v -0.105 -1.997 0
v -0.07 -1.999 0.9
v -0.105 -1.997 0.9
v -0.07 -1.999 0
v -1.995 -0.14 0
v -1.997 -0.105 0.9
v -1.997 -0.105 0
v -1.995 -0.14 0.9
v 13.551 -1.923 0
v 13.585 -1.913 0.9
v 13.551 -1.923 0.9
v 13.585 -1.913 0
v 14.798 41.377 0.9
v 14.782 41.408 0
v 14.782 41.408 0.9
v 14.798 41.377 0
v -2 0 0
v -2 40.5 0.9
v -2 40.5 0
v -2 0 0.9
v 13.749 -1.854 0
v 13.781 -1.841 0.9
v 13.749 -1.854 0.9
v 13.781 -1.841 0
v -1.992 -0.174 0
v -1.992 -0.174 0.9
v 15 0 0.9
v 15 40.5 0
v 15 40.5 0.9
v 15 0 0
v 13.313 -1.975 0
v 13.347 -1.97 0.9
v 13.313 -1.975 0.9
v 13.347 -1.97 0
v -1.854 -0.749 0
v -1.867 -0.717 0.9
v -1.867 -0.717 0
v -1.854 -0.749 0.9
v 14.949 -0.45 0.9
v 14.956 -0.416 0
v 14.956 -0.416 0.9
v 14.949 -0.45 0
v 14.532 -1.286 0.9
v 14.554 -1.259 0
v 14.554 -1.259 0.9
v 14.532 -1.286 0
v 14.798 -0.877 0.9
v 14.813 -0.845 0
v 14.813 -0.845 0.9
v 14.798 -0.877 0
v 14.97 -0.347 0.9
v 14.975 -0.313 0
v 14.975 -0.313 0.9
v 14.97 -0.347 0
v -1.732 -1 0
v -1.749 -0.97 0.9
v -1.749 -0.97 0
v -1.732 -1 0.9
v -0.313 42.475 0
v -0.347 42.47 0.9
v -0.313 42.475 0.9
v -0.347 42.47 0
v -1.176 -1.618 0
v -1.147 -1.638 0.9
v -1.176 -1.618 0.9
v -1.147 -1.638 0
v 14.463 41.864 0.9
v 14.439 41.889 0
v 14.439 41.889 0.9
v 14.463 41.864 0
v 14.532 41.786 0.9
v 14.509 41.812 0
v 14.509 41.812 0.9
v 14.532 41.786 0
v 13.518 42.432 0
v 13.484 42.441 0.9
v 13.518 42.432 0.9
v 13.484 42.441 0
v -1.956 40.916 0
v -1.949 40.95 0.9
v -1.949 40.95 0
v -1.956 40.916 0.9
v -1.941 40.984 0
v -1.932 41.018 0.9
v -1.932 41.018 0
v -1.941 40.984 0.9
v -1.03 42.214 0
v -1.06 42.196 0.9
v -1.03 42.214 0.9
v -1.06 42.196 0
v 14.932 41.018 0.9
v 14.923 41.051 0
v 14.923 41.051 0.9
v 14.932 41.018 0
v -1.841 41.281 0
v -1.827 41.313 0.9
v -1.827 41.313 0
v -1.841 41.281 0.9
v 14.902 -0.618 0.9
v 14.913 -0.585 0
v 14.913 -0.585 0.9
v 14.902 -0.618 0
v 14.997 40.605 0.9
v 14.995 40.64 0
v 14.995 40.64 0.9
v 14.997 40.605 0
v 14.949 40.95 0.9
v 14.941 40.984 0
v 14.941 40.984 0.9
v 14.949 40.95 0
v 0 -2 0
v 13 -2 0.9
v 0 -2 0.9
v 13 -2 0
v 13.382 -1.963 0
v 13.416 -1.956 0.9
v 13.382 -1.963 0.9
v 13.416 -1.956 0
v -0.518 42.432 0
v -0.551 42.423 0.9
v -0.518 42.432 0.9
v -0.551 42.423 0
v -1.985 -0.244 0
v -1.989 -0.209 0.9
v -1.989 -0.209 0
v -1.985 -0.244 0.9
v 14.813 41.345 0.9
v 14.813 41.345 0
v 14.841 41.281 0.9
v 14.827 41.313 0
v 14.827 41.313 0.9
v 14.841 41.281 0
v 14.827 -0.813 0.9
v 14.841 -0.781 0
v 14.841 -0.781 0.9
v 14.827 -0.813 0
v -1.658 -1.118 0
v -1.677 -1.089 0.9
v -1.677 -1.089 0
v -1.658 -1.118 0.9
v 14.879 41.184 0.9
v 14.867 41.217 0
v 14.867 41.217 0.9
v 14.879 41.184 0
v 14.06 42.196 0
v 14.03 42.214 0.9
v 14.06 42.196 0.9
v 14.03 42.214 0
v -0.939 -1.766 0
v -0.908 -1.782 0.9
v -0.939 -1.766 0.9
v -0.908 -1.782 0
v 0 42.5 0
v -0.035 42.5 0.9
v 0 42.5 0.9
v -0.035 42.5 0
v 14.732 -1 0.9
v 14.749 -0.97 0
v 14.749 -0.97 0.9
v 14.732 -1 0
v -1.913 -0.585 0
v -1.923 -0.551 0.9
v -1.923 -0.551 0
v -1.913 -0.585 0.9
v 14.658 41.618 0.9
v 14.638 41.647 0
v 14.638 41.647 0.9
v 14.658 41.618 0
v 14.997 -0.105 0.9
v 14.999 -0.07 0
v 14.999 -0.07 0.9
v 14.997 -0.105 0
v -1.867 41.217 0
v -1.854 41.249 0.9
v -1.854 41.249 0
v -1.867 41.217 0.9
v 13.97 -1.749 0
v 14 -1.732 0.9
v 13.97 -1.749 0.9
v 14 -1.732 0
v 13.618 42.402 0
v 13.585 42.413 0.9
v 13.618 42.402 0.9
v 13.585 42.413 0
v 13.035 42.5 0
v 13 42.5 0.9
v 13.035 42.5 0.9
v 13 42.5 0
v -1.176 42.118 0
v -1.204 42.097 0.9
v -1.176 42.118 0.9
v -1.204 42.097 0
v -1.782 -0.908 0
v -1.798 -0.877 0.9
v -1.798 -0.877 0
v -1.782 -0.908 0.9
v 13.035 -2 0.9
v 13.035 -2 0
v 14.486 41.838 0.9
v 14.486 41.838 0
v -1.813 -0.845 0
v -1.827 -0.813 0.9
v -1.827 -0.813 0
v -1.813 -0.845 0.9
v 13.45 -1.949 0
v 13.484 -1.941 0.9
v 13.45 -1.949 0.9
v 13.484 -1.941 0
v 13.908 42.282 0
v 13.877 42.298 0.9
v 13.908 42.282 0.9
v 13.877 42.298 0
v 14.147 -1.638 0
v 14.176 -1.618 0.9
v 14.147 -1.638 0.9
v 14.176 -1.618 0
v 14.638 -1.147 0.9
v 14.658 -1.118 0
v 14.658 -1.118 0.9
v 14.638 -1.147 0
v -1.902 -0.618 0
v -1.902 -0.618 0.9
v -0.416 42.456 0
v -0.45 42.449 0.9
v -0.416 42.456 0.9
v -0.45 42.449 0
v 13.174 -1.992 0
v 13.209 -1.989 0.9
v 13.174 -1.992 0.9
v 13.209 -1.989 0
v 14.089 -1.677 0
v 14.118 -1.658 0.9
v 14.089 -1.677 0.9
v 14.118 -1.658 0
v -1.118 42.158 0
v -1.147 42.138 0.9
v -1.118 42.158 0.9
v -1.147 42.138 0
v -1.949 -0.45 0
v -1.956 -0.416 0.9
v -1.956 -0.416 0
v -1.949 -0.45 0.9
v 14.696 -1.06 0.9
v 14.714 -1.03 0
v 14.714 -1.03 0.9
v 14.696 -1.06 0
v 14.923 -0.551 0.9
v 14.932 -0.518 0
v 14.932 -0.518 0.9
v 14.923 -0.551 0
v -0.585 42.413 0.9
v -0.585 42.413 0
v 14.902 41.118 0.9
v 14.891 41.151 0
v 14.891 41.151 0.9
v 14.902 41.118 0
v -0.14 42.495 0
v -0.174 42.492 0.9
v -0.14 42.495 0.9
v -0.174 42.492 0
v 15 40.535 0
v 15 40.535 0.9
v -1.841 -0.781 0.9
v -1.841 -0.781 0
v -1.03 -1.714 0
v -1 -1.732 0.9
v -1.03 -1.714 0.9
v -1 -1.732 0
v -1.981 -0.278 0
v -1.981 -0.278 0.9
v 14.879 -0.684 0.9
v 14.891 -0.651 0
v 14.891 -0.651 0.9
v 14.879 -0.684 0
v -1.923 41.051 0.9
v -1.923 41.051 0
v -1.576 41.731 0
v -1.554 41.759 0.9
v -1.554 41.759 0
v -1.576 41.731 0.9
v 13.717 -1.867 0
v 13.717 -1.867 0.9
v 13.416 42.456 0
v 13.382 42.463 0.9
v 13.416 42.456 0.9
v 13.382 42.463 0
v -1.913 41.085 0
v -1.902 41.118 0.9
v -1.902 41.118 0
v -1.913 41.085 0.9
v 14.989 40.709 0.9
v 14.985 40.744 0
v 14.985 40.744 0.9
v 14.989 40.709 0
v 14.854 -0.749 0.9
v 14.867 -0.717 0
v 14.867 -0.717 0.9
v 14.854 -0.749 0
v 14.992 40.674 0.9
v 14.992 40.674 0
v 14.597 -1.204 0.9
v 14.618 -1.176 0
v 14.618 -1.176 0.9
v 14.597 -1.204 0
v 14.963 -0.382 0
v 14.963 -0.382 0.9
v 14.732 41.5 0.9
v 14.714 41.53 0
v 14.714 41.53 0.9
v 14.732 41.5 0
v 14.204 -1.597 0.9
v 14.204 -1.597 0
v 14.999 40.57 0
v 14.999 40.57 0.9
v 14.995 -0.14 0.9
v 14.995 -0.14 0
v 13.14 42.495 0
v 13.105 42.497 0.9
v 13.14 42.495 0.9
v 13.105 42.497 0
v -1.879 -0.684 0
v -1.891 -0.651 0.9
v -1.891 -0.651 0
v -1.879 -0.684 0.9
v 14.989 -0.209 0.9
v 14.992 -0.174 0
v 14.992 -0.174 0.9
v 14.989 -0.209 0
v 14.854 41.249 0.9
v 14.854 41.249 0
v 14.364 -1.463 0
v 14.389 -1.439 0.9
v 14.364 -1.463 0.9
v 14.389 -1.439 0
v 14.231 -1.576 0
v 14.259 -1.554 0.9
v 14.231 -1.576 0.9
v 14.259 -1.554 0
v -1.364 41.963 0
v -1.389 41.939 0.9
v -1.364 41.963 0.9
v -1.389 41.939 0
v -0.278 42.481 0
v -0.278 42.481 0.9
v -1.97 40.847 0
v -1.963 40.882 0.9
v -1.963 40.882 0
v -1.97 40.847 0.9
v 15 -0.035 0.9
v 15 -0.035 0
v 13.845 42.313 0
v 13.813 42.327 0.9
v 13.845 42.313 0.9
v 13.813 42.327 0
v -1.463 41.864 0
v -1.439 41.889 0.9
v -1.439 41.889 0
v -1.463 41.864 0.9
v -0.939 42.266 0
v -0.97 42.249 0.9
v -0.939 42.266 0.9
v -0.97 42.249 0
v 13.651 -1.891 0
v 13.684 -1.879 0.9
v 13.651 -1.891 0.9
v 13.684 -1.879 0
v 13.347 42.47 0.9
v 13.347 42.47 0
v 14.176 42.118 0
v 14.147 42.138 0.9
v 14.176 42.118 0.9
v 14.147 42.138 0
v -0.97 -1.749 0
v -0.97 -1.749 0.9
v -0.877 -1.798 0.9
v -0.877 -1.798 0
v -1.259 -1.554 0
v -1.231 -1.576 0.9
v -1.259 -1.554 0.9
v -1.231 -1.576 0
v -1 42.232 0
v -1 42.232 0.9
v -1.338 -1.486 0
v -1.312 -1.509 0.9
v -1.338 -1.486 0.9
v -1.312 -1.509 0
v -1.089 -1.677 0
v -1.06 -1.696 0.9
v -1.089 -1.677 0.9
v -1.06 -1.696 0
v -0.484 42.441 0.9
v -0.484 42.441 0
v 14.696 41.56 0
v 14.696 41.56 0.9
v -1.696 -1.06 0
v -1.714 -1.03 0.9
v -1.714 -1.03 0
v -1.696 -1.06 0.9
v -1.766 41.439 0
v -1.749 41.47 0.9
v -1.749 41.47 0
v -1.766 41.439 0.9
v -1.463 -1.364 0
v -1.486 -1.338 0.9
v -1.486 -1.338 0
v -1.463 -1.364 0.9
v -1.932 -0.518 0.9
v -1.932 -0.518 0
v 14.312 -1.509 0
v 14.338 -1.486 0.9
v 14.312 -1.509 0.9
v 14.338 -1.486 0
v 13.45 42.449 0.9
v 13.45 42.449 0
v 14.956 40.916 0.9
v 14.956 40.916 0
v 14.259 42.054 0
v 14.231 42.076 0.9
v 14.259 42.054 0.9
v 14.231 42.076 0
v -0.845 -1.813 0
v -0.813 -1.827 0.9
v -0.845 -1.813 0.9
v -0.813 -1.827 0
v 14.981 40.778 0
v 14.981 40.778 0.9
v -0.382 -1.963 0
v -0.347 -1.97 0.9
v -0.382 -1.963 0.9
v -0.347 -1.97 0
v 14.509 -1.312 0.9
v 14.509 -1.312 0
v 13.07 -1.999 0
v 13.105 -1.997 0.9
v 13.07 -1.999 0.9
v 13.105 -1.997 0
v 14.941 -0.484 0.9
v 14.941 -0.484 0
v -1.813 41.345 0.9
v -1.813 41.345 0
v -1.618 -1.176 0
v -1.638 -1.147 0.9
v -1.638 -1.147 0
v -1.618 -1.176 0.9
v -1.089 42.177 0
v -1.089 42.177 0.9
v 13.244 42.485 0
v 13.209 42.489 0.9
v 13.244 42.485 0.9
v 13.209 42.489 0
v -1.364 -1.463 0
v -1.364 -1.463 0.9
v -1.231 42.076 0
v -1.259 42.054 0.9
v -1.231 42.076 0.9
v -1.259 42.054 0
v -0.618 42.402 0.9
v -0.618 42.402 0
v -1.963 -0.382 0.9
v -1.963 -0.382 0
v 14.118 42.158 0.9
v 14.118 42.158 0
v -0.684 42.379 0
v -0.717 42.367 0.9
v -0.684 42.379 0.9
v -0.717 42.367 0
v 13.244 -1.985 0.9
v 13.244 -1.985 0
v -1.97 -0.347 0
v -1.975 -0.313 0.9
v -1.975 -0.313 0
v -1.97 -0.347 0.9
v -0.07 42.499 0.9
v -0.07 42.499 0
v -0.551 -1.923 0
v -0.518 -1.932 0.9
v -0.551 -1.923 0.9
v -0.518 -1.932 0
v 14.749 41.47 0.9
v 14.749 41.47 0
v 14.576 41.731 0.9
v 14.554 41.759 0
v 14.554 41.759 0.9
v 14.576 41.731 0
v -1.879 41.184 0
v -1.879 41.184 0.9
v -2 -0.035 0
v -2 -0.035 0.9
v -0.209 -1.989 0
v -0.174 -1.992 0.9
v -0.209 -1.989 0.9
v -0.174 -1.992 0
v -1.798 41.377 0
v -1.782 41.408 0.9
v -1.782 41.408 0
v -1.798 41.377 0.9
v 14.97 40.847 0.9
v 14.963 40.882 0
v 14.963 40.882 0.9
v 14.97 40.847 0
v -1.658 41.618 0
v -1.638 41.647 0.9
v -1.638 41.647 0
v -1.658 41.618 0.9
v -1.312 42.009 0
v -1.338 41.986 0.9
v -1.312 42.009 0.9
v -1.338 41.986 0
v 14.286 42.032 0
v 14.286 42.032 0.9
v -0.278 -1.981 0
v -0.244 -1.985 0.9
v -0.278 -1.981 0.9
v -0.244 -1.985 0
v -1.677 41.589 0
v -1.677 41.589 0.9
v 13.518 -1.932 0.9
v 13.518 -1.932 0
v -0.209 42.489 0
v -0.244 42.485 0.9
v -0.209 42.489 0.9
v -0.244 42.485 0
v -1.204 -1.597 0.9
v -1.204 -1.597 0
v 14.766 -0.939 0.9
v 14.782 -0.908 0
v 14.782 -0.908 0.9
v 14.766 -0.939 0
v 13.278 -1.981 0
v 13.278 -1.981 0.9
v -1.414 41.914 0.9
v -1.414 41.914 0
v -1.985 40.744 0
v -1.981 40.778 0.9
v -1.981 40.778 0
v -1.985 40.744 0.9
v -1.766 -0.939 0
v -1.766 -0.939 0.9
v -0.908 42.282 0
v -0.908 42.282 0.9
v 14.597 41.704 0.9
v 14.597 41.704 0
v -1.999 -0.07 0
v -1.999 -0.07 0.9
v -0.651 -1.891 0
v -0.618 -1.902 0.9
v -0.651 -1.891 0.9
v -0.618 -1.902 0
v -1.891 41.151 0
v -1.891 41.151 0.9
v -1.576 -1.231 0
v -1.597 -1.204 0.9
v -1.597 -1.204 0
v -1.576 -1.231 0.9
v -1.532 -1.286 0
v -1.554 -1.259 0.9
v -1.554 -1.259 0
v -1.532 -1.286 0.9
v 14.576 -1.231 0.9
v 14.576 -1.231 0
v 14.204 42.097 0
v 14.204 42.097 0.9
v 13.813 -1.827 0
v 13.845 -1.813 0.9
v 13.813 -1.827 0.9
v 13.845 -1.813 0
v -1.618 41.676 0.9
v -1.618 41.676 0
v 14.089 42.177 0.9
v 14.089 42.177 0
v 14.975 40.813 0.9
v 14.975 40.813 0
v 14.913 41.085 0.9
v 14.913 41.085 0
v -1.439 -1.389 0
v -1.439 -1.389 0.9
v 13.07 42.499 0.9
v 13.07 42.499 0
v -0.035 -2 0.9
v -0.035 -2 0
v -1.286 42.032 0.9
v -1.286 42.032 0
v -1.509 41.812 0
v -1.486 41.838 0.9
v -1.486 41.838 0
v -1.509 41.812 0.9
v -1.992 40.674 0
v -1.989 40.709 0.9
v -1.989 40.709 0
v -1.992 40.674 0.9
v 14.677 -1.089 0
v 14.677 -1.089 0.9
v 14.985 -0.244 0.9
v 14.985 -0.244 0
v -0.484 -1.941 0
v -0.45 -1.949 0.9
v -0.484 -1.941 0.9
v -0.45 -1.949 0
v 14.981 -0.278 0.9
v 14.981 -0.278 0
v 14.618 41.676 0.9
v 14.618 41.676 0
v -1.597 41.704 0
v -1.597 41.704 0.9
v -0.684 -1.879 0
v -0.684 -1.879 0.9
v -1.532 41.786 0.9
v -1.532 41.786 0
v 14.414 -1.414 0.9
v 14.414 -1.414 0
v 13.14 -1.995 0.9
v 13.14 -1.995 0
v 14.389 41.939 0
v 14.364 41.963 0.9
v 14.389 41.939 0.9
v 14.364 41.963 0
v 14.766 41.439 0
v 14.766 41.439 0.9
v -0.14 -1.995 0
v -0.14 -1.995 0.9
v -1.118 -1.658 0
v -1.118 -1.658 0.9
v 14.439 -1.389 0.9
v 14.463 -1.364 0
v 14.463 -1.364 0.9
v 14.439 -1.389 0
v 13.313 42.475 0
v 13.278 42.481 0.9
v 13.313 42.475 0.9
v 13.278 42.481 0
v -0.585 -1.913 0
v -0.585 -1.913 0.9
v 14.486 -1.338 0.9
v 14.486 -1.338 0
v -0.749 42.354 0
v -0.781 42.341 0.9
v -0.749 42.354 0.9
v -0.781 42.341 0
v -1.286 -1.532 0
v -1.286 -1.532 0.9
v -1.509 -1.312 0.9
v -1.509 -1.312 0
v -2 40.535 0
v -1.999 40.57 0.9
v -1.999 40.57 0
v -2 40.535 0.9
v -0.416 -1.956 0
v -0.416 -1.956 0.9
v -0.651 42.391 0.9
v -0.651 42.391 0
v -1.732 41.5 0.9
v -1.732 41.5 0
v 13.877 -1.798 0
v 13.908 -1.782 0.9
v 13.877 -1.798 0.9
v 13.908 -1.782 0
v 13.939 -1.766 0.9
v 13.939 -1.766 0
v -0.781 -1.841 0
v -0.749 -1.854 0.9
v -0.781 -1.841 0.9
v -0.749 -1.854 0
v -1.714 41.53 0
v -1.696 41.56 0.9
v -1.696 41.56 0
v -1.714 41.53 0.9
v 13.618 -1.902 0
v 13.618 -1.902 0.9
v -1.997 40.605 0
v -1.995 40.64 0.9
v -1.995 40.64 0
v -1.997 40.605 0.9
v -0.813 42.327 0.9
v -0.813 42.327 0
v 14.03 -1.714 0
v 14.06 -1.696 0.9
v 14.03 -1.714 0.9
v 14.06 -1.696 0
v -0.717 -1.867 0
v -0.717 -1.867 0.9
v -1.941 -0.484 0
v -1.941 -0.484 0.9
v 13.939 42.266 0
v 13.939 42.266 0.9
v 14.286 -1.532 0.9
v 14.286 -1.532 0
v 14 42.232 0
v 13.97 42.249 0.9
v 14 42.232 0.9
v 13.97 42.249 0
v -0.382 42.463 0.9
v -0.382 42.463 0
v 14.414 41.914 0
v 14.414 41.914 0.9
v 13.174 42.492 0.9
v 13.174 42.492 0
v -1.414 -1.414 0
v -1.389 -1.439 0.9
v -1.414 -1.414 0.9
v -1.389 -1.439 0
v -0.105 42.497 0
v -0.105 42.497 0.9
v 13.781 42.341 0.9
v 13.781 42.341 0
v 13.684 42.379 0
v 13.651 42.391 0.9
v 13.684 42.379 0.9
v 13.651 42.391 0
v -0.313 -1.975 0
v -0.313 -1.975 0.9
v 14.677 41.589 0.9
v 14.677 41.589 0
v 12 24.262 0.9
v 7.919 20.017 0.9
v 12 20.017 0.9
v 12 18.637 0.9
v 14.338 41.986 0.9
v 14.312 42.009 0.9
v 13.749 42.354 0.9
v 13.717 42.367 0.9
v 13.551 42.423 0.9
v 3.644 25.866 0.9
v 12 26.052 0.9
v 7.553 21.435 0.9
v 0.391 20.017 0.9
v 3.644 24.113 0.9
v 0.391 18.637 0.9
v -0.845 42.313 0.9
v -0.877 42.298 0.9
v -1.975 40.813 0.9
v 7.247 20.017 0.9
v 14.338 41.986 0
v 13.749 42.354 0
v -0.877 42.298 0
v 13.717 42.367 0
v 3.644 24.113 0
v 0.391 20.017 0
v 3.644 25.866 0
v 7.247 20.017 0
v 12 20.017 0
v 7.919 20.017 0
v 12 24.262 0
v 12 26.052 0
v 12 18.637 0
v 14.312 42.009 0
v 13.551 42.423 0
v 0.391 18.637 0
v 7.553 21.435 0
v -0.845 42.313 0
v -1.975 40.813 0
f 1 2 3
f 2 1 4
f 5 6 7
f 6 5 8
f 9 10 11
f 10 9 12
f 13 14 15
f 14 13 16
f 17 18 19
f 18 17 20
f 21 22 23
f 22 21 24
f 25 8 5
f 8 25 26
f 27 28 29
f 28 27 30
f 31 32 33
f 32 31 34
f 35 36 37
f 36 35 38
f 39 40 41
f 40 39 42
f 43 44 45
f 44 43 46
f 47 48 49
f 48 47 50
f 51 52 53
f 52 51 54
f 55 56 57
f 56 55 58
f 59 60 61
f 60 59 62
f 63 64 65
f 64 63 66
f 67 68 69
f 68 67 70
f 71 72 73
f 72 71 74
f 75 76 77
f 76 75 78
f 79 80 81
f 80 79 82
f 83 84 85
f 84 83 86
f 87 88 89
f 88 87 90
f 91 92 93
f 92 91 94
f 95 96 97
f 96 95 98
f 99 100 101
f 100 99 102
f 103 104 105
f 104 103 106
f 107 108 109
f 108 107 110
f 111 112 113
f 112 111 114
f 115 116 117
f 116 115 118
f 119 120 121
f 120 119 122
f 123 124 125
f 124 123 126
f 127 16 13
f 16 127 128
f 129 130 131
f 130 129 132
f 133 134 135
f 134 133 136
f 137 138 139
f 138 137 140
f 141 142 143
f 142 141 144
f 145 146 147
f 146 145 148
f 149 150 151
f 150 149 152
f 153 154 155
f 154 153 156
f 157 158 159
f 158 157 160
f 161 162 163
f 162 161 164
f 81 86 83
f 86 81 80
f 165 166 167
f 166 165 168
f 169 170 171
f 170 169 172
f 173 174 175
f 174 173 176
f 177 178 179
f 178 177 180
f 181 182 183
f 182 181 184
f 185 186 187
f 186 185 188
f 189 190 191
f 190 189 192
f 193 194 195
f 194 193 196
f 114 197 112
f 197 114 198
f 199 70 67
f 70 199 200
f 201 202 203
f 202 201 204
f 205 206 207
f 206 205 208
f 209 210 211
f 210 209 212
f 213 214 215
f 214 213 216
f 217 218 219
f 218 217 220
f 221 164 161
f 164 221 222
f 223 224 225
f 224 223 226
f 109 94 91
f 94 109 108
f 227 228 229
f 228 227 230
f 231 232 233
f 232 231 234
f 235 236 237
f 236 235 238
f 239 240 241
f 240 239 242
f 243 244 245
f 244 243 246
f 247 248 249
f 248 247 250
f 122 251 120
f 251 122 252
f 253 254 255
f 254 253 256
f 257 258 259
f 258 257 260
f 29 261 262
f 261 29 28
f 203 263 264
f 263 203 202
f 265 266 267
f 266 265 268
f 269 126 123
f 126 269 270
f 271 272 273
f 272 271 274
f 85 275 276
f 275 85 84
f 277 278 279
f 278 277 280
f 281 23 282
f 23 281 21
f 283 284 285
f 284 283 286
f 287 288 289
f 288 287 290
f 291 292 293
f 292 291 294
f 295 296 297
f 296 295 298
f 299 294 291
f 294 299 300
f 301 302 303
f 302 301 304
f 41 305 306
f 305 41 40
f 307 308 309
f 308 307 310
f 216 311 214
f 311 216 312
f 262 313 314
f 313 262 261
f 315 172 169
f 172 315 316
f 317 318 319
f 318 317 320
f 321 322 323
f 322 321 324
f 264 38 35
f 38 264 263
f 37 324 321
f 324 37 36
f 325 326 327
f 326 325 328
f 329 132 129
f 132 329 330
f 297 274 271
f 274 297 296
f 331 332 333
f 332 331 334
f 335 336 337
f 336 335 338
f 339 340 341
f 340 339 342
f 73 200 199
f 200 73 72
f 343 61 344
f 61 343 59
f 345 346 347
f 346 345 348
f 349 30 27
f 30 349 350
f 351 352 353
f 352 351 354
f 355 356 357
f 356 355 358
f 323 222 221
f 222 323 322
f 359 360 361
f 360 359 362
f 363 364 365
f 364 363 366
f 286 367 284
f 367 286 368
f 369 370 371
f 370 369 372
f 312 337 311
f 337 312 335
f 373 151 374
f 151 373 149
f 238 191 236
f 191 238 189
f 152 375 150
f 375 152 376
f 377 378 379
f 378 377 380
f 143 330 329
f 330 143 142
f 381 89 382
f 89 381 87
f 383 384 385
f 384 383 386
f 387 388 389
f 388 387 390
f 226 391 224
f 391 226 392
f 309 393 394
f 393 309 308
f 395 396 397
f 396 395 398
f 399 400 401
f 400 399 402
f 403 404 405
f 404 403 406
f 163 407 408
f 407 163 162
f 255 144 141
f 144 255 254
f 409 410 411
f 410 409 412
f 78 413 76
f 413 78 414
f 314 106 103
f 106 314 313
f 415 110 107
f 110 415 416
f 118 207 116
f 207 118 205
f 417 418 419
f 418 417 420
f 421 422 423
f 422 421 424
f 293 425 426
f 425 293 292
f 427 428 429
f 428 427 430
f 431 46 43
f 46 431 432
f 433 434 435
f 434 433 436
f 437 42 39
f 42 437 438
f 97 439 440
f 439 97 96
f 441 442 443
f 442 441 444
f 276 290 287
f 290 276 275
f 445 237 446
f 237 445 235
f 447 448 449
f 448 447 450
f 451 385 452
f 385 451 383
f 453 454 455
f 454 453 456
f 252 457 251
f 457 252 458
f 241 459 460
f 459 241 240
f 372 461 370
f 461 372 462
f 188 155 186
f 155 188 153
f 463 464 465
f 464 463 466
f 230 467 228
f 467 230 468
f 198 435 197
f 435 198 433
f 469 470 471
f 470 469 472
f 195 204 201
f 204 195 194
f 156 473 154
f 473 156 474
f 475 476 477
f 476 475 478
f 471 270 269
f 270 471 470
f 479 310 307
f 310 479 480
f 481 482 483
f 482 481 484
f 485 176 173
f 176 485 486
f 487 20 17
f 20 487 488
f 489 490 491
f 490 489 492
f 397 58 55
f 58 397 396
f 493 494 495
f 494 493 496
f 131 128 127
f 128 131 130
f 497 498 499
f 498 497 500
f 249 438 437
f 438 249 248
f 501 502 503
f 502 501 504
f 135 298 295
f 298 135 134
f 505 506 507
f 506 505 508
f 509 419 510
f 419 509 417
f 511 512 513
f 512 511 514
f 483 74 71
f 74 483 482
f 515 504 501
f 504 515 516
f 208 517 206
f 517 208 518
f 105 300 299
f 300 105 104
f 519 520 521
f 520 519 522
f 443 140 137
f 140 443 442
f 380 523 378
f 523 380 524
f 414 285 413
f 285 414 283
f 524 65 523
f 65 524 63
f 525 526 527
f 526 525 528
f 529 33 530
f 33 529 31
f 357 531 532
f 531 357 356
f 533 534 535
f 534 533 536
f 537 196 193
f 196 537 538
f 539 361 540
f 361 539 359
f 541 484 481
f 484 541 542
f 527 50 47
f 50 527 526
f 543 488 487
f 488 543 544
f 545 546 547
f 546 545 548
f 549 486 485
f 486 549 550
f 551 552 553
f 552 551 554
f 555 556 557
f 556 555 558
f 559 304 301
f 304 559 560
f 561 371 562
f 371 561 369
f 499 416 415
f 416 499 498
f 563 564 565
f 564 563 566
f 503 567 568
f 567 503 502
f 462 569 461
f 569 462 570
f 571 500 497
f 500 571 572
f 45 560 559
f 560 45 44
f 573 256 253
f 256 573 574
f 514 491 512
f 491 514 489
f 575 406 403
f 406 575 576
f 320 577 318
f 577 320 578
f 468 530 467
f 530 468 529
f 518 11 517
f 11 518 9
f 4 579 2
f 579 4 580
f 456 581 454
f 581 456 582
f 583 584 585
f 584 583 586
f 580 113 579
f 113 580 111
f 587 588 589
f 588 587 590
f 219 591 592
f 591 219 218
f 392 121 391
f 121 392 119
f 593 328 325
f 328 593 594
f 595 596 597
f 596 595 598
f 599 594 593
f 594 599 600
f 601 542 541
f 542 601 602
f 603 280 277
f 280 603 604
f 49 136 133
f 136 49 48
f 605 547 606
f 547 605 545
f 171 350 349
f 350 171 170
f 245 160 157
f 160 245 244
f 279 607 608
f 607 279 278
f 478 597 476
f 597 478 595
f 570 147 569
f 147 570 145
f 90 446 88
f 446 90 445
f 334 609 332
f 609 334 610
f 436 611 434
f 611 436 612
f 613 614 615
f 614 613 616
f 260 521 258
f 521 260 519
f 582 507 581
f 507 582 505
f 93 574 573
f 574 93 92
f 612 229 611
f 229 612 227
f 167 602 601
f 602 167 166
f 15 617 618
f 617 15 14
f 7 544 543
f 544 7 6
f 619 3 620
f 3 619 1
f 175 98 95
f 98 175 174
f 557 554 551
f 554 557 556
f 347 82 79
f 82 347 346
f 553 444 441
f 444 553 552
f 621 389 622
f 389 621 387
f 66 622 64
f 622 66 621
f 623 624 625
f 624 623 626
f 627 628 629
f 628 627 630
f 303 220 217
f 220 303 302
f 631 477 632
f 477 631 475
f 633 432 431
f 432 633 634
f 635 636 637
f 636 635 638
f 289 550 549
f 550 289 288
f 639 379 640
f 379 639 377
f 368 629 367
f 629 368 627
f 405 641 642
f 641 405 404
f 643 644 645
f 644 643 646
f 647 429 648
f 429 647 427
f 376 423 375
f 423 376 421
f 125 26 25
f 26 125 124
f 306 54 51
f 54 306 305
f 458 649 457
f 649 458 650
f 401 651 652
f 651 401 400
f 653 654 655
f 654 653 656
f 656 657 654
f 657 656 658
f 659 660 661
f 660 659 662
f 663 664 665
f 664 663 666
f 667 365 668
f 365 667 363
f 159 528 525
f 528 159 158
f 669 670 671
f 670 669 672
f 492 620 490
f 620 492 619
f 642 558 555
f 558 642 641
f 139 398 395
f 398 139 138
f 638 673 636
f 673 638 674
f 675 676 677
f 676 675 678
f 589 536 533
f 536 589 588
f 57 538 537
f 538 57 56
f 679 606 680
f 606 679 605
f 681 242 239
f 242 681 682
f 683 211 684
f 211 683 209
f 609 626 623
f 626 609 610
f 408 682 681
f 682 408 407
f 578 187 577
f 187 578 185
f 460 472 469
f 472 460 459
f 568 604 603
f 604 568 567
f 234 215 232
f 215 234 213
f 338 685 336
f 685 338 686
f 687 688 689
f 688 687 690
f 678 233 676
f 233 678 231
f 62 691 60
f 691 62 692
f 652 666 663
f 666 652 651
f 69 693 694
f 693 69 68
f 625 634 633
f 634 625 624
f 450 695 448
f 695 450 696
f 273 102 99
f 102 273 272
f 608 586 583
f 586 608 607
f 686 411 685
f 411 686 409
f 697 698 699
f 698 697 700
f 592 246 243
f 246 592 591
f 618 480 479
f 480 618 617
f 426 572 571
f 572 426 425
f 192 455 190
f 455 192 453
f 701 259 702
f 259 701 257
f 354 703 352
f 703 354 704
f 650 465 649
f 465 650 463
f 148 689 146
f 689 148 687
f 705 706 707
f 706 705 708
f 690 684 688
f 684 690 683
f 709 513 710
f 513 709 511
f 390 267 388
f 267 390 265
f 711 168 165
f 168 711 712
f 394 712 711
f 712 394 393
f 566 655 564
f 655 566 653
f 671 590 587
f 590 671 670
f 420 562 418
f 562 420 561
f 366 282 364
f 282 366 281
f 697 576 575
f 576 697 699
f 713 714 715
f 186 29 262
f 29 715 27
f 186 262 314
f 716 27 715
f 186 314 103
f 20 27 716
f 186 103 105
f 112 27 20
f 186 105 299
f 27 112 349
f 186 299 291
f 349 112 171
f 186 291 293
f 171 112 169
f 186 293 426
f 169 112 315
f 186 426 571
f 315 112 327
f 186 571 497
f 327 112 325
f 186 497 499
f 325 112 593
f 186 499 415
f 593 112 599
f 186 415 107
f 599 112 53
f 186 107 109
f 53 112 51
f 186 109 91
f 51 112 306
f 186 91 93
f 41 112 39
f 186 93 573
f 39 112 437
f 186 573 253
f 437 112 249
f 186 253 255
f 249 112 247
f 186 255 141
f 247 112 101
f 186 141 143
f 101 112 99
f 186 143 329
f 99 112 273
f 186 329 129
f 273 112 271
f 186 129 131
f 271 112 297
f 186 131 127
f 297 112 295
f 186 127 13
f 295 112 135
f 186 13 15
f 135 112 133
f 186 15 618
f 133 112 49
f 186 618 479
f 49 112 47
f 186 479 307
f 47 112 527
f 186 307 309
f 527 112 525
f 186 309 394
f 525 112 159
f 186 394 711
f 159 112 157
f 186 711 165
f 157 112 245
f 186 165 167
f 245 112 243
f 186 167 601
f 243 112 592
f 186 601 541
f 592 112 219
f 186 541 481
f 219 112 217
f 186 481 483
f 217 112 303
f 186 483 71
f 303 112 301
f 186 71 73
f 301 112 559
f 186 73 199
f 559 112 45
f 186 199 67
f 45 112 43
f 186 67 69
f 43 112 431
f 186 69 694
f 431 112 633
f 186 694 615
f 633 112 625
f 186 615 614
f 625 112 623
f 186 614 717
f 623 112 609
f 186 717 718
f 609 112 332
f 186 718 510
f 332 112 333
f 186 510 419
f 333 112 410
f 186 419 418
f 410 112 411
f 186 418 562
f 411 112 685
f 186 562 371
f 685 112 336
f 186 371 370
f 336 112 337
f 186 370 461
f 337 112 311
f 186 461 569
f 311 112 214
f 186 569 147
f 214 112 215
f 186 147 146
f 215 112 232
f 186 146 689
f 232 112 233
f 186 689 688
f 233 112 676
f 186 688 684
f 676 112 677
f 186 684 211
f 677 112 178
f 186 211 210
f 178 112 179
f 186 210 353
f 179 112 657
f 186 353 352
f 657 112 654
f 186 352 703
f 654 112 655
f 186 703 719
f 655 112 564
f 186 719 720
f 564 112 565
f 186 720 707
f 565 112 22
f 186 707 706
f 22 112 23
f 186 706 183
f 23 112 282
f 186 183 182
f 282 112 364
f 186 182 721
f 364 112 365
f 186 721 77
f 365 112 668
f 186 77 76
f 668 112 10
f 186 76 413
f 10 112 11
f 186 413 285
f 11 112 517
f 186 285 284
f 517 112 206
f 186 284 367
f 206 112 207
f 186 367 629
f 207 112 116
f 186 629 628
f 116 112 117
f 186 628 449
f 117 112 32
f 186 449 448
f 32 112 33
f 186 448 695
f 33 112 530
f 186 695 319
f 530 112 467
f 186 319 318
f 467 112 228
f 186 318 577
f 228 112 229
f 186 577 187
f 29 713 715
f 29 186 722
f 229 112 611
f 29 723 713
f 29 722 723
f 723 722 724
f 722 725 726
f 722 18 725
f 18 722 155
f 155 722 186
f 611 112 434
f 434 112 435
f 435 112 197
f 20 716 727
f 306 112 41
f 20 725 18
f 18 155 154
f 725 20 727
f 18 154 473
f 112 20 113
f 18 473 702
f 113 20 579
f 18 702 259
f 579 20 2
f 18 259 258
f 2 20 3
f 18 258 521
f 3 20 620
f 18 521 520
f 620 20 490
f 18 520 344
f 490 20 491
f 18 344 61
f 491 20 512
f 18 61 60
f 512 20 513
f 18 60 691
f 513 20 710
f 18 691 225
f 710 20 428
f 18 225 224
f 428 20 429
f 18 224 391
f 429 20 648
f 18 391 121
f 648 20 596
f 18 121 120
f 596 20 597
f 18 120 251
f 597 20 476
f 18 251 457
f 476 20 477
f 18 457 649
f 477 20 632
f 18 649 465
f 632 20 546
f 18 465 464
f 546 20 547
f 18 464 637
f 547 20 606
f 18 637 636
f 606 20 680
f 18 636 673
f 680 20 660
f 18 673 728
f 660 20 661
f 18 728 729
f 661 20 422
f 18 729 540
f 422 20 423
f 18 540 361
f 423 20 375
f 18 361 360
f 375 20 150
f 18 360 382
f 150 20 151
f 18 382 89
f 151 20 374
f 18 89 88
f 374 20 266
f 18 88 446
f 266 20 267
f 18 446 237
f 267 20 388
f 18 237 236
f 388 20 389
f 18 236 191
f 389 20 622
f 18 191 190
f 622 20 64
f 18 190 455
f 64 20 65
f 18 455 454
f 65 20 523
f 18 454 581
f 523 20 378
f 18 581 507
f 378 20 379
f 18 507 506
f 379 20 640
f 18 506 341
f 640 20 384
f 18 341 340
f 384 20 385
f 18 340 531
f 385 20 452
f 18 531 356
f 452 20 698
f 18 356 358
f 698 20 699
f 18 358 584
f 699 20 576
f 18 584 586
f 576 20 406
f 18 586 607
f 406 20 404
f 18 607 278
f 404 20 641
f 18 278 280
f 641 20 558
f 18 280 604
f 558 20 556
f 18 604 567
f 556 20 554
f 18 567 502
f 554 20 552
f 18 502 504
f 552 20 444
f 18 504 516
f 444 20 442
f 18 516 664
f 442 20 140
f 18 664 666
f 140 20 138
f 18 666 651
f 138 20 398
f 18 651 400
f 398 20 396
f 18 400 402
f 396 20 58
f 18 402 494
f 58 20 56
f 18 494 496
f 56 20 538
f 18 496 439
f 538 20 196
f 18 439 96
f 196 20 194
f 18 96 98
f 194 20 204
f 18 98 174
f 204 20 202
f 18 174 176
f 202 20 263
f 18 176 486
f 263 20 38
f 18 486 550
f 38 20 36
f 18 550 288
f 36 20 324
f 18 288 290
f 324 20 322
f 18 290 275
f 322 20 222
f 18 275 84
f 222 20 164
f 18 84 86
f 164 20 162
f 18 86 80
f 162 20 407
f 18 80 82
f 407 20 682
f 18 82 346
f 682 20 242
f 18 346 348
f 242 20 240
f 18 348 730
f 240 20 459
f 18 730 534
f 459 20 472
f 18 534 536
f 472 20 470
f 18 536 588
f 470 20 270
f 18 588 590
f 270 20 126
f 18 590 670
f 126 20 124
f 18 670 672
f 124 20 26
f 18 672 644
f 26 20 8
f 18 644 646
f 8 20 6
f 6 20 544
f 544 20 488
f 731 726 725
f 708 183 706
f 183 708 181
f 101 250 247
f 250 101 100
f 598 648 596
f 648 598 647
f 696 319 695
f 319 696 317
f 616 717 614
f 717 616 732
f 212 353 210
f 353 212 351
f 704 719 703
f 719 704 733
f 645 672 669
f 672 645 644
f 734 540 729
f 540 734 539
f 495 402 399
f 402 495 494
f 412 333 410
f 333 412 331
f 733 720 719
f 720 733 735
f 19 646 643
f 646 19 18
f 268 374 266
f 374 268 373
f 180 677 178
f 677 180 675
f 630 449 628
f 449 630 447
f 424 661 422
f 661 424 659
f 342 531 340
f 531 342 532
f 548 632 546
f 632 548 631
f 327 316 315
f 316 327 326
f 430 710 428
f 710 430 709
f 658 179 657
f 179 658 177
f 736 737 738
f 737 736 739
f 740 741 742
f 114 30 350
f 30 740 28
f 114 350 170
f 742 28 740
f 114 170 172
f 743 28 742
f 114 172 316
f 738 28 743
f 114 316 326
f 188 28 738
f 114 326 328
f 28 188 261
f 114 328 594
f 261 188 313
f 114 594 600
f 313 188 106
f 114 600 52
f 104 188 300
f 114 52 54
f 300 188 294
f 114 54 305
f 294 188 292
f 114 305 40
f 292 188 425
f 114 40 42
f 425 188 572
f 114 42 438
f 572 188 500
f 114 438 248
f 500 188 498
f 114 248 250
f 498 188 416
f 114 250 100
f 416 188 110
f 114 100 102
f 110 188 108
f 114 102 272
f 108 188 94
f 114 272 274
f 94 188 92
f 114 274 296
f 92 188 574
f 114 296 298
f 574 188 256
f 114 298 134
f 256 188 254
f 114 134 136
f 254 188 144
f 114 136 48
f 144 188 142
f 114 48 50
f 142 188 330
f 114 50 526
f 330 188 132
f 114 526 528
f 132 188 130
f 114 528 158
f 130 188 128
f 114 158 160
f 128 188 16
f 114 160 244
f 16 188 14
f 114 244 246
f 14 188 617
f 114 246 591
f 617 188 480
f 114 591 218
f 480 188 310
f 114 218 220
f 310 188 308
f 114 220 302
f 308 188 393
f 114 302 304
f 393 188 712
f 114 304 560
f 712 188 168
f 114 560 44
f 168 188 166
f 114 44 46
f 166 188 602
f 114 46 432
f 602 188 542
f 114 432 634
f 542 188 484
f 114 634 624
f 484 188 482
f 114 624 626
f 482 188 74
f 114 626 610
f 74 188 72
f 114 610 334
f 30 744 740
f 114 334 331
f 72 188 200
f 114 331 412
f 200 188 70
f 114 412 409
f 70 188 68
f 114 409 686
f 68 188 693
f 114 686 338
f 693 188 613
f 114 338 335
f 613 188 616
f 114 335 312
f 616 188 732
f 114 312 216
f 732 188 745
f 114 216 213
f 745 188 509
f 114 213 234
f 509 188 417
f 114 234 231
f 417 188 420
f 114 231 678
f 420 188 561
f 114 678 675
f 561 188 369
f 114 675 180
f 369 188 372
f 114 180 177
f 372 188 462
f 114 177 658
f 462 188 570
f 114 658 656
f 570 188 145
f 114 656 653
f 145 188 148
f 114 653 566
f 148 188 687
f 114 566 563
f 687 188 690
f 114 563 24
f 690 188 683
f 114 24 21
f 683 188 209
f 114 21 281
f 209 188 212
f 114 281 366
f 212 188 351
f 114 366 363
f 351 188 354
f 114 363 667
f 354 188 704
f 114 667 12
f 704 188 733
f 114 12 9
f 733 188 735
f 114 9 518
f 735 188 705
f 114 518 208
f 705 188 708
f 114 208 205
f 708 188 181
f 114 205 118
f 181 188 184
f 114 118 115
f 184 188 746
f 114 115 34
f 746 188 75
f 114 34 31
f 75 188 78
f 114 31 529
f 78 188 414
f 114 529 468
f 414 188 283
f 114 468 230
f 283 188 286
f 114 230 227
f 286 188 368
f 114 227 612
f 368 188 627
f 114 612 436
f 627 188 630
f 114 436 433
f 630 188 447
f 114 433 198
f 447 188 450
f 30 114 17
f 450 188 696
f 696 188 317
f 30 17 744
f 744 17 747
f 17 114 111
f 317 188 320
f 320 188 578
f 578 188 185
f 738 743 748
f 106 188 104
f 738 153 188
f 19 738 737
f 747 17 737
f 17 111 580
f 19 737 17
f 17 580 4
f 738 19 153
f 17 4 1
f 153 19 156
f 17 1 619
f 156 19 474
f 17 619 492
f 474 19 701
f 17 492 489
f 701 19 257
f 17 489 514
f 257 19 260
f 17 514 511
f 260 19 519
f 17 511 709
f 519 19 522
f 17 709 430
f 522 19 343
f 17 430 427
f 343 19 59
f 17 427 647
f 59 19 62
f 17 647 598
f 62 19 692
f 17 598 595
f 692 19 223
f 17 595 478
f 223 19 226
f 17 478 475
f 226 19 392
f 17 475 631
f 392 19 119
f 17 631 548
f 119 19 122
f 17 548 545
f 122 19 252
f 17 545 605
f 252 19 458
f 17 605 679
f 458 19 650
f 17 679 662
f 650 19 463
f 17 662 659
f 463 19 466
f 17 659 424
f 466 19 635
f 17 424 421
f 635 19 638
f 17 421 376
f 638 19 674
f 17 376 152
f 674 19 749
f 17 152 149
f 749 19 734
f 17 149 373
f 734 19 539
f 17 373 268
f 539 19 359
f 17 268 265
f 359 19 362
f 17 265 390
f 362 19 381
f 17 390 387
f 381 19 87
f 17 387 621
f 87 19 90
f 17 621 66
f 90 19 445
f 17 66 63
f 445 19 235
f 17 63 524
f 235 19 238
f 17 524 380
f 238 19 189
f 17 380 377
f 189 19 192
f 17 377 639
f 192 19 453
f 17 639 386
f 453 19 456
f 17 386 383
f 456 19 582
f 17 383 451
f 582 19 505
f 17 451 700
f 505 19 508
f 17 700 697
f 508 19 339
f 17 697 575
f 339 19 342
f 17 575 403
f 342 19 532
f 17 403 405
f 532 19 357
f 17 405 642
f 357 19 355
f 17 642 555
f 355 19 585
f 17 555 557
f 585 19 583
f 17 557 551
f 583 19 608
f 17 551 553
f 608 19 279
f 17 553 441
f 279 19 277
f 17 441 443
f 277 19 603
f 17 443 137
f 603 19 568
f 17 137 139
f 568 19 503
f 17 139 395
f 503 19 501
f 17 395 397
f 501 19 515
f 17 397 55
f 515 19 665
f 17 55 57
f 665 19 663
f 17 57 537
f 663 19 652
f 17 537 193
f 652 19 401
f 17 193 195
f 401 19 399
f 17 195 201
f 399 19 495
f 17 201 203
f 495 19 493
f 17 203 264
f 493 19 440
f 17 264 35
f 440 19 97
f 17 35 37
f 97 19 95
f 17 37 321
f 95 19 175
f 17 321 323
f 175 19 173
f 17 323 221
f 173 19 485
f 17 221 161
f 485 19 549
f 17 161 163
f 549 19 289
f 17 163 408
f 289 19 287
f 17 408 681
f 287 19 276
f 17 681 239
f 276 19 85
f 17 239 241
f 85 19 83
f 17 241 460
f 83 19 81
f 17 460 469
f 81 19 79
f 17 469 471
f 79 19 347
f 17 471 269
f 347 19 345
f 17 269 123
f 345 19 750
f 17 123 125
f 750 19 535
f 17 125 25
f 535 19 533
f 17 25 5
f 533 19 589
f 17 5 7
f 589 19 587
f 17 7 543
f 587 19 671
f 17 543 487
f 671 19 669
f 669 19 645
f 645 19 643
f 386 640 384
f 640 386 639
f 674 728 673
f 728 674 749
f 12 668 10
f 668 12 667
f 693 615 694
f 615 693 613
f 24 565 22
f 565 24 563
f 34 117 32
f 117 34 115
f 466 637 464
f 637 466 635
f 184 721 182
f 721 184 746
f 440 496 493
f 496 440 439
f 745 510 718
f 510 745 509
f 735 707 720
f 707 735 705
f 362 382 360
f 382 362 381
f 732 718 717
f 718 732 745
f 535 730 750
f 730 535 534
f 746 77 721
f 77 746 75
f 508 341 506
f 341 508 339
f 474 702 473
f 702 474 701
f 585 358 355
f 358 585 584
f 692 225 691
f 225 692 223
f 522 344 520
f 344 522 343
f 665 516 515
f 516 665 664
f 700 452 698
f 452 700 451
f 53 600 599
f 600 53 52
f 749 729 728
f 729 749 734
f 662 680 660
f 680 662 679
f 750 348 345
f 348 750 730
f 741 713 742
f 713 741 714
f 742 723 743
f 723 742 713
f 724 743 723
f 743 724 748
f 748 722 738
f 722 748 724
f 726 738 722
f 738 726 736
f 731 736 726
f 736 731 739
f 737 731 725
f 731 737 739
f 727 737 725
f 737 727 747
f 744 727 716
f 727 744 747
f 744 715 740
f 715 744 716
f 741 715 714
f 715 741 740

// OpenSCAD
$fn=360;

//chapa para la base del ventilador de portatil tacens

//glass
glass_height=1.5;
*hull() {
    cylinder(r=2, h=glass_height);
    translate([13,0,0]) cylinder(r=2, h=glass_height);
    translate([0,40.5,0]) cylinder(r=2, h=glass_height);
    translate([13,40.5,0]) cylinder(r=2, h=glass_height);
}

//mask
mask_height = 0.9;
difference() {
    hull() {
        cylinder(r=2, h=mask_height);
        translate([13,0,0]) cylinder(r=2, h=mask_height);
        translate([0,40.5,0]) cylinder(r=2, h=mask_height);
        translate([13,40.5,0]) cylinder(r=2, h=mask_height);
    }
    union() {
        translate([12,17.25,-1]) rotate([0,0,90]) linear_extrude(height = mask_height+2, center = false, convexity = 10, twist = 0, slices = 20, scale = 1.0) text("k",11,"Cardinal:style=Regular");
    }
}
